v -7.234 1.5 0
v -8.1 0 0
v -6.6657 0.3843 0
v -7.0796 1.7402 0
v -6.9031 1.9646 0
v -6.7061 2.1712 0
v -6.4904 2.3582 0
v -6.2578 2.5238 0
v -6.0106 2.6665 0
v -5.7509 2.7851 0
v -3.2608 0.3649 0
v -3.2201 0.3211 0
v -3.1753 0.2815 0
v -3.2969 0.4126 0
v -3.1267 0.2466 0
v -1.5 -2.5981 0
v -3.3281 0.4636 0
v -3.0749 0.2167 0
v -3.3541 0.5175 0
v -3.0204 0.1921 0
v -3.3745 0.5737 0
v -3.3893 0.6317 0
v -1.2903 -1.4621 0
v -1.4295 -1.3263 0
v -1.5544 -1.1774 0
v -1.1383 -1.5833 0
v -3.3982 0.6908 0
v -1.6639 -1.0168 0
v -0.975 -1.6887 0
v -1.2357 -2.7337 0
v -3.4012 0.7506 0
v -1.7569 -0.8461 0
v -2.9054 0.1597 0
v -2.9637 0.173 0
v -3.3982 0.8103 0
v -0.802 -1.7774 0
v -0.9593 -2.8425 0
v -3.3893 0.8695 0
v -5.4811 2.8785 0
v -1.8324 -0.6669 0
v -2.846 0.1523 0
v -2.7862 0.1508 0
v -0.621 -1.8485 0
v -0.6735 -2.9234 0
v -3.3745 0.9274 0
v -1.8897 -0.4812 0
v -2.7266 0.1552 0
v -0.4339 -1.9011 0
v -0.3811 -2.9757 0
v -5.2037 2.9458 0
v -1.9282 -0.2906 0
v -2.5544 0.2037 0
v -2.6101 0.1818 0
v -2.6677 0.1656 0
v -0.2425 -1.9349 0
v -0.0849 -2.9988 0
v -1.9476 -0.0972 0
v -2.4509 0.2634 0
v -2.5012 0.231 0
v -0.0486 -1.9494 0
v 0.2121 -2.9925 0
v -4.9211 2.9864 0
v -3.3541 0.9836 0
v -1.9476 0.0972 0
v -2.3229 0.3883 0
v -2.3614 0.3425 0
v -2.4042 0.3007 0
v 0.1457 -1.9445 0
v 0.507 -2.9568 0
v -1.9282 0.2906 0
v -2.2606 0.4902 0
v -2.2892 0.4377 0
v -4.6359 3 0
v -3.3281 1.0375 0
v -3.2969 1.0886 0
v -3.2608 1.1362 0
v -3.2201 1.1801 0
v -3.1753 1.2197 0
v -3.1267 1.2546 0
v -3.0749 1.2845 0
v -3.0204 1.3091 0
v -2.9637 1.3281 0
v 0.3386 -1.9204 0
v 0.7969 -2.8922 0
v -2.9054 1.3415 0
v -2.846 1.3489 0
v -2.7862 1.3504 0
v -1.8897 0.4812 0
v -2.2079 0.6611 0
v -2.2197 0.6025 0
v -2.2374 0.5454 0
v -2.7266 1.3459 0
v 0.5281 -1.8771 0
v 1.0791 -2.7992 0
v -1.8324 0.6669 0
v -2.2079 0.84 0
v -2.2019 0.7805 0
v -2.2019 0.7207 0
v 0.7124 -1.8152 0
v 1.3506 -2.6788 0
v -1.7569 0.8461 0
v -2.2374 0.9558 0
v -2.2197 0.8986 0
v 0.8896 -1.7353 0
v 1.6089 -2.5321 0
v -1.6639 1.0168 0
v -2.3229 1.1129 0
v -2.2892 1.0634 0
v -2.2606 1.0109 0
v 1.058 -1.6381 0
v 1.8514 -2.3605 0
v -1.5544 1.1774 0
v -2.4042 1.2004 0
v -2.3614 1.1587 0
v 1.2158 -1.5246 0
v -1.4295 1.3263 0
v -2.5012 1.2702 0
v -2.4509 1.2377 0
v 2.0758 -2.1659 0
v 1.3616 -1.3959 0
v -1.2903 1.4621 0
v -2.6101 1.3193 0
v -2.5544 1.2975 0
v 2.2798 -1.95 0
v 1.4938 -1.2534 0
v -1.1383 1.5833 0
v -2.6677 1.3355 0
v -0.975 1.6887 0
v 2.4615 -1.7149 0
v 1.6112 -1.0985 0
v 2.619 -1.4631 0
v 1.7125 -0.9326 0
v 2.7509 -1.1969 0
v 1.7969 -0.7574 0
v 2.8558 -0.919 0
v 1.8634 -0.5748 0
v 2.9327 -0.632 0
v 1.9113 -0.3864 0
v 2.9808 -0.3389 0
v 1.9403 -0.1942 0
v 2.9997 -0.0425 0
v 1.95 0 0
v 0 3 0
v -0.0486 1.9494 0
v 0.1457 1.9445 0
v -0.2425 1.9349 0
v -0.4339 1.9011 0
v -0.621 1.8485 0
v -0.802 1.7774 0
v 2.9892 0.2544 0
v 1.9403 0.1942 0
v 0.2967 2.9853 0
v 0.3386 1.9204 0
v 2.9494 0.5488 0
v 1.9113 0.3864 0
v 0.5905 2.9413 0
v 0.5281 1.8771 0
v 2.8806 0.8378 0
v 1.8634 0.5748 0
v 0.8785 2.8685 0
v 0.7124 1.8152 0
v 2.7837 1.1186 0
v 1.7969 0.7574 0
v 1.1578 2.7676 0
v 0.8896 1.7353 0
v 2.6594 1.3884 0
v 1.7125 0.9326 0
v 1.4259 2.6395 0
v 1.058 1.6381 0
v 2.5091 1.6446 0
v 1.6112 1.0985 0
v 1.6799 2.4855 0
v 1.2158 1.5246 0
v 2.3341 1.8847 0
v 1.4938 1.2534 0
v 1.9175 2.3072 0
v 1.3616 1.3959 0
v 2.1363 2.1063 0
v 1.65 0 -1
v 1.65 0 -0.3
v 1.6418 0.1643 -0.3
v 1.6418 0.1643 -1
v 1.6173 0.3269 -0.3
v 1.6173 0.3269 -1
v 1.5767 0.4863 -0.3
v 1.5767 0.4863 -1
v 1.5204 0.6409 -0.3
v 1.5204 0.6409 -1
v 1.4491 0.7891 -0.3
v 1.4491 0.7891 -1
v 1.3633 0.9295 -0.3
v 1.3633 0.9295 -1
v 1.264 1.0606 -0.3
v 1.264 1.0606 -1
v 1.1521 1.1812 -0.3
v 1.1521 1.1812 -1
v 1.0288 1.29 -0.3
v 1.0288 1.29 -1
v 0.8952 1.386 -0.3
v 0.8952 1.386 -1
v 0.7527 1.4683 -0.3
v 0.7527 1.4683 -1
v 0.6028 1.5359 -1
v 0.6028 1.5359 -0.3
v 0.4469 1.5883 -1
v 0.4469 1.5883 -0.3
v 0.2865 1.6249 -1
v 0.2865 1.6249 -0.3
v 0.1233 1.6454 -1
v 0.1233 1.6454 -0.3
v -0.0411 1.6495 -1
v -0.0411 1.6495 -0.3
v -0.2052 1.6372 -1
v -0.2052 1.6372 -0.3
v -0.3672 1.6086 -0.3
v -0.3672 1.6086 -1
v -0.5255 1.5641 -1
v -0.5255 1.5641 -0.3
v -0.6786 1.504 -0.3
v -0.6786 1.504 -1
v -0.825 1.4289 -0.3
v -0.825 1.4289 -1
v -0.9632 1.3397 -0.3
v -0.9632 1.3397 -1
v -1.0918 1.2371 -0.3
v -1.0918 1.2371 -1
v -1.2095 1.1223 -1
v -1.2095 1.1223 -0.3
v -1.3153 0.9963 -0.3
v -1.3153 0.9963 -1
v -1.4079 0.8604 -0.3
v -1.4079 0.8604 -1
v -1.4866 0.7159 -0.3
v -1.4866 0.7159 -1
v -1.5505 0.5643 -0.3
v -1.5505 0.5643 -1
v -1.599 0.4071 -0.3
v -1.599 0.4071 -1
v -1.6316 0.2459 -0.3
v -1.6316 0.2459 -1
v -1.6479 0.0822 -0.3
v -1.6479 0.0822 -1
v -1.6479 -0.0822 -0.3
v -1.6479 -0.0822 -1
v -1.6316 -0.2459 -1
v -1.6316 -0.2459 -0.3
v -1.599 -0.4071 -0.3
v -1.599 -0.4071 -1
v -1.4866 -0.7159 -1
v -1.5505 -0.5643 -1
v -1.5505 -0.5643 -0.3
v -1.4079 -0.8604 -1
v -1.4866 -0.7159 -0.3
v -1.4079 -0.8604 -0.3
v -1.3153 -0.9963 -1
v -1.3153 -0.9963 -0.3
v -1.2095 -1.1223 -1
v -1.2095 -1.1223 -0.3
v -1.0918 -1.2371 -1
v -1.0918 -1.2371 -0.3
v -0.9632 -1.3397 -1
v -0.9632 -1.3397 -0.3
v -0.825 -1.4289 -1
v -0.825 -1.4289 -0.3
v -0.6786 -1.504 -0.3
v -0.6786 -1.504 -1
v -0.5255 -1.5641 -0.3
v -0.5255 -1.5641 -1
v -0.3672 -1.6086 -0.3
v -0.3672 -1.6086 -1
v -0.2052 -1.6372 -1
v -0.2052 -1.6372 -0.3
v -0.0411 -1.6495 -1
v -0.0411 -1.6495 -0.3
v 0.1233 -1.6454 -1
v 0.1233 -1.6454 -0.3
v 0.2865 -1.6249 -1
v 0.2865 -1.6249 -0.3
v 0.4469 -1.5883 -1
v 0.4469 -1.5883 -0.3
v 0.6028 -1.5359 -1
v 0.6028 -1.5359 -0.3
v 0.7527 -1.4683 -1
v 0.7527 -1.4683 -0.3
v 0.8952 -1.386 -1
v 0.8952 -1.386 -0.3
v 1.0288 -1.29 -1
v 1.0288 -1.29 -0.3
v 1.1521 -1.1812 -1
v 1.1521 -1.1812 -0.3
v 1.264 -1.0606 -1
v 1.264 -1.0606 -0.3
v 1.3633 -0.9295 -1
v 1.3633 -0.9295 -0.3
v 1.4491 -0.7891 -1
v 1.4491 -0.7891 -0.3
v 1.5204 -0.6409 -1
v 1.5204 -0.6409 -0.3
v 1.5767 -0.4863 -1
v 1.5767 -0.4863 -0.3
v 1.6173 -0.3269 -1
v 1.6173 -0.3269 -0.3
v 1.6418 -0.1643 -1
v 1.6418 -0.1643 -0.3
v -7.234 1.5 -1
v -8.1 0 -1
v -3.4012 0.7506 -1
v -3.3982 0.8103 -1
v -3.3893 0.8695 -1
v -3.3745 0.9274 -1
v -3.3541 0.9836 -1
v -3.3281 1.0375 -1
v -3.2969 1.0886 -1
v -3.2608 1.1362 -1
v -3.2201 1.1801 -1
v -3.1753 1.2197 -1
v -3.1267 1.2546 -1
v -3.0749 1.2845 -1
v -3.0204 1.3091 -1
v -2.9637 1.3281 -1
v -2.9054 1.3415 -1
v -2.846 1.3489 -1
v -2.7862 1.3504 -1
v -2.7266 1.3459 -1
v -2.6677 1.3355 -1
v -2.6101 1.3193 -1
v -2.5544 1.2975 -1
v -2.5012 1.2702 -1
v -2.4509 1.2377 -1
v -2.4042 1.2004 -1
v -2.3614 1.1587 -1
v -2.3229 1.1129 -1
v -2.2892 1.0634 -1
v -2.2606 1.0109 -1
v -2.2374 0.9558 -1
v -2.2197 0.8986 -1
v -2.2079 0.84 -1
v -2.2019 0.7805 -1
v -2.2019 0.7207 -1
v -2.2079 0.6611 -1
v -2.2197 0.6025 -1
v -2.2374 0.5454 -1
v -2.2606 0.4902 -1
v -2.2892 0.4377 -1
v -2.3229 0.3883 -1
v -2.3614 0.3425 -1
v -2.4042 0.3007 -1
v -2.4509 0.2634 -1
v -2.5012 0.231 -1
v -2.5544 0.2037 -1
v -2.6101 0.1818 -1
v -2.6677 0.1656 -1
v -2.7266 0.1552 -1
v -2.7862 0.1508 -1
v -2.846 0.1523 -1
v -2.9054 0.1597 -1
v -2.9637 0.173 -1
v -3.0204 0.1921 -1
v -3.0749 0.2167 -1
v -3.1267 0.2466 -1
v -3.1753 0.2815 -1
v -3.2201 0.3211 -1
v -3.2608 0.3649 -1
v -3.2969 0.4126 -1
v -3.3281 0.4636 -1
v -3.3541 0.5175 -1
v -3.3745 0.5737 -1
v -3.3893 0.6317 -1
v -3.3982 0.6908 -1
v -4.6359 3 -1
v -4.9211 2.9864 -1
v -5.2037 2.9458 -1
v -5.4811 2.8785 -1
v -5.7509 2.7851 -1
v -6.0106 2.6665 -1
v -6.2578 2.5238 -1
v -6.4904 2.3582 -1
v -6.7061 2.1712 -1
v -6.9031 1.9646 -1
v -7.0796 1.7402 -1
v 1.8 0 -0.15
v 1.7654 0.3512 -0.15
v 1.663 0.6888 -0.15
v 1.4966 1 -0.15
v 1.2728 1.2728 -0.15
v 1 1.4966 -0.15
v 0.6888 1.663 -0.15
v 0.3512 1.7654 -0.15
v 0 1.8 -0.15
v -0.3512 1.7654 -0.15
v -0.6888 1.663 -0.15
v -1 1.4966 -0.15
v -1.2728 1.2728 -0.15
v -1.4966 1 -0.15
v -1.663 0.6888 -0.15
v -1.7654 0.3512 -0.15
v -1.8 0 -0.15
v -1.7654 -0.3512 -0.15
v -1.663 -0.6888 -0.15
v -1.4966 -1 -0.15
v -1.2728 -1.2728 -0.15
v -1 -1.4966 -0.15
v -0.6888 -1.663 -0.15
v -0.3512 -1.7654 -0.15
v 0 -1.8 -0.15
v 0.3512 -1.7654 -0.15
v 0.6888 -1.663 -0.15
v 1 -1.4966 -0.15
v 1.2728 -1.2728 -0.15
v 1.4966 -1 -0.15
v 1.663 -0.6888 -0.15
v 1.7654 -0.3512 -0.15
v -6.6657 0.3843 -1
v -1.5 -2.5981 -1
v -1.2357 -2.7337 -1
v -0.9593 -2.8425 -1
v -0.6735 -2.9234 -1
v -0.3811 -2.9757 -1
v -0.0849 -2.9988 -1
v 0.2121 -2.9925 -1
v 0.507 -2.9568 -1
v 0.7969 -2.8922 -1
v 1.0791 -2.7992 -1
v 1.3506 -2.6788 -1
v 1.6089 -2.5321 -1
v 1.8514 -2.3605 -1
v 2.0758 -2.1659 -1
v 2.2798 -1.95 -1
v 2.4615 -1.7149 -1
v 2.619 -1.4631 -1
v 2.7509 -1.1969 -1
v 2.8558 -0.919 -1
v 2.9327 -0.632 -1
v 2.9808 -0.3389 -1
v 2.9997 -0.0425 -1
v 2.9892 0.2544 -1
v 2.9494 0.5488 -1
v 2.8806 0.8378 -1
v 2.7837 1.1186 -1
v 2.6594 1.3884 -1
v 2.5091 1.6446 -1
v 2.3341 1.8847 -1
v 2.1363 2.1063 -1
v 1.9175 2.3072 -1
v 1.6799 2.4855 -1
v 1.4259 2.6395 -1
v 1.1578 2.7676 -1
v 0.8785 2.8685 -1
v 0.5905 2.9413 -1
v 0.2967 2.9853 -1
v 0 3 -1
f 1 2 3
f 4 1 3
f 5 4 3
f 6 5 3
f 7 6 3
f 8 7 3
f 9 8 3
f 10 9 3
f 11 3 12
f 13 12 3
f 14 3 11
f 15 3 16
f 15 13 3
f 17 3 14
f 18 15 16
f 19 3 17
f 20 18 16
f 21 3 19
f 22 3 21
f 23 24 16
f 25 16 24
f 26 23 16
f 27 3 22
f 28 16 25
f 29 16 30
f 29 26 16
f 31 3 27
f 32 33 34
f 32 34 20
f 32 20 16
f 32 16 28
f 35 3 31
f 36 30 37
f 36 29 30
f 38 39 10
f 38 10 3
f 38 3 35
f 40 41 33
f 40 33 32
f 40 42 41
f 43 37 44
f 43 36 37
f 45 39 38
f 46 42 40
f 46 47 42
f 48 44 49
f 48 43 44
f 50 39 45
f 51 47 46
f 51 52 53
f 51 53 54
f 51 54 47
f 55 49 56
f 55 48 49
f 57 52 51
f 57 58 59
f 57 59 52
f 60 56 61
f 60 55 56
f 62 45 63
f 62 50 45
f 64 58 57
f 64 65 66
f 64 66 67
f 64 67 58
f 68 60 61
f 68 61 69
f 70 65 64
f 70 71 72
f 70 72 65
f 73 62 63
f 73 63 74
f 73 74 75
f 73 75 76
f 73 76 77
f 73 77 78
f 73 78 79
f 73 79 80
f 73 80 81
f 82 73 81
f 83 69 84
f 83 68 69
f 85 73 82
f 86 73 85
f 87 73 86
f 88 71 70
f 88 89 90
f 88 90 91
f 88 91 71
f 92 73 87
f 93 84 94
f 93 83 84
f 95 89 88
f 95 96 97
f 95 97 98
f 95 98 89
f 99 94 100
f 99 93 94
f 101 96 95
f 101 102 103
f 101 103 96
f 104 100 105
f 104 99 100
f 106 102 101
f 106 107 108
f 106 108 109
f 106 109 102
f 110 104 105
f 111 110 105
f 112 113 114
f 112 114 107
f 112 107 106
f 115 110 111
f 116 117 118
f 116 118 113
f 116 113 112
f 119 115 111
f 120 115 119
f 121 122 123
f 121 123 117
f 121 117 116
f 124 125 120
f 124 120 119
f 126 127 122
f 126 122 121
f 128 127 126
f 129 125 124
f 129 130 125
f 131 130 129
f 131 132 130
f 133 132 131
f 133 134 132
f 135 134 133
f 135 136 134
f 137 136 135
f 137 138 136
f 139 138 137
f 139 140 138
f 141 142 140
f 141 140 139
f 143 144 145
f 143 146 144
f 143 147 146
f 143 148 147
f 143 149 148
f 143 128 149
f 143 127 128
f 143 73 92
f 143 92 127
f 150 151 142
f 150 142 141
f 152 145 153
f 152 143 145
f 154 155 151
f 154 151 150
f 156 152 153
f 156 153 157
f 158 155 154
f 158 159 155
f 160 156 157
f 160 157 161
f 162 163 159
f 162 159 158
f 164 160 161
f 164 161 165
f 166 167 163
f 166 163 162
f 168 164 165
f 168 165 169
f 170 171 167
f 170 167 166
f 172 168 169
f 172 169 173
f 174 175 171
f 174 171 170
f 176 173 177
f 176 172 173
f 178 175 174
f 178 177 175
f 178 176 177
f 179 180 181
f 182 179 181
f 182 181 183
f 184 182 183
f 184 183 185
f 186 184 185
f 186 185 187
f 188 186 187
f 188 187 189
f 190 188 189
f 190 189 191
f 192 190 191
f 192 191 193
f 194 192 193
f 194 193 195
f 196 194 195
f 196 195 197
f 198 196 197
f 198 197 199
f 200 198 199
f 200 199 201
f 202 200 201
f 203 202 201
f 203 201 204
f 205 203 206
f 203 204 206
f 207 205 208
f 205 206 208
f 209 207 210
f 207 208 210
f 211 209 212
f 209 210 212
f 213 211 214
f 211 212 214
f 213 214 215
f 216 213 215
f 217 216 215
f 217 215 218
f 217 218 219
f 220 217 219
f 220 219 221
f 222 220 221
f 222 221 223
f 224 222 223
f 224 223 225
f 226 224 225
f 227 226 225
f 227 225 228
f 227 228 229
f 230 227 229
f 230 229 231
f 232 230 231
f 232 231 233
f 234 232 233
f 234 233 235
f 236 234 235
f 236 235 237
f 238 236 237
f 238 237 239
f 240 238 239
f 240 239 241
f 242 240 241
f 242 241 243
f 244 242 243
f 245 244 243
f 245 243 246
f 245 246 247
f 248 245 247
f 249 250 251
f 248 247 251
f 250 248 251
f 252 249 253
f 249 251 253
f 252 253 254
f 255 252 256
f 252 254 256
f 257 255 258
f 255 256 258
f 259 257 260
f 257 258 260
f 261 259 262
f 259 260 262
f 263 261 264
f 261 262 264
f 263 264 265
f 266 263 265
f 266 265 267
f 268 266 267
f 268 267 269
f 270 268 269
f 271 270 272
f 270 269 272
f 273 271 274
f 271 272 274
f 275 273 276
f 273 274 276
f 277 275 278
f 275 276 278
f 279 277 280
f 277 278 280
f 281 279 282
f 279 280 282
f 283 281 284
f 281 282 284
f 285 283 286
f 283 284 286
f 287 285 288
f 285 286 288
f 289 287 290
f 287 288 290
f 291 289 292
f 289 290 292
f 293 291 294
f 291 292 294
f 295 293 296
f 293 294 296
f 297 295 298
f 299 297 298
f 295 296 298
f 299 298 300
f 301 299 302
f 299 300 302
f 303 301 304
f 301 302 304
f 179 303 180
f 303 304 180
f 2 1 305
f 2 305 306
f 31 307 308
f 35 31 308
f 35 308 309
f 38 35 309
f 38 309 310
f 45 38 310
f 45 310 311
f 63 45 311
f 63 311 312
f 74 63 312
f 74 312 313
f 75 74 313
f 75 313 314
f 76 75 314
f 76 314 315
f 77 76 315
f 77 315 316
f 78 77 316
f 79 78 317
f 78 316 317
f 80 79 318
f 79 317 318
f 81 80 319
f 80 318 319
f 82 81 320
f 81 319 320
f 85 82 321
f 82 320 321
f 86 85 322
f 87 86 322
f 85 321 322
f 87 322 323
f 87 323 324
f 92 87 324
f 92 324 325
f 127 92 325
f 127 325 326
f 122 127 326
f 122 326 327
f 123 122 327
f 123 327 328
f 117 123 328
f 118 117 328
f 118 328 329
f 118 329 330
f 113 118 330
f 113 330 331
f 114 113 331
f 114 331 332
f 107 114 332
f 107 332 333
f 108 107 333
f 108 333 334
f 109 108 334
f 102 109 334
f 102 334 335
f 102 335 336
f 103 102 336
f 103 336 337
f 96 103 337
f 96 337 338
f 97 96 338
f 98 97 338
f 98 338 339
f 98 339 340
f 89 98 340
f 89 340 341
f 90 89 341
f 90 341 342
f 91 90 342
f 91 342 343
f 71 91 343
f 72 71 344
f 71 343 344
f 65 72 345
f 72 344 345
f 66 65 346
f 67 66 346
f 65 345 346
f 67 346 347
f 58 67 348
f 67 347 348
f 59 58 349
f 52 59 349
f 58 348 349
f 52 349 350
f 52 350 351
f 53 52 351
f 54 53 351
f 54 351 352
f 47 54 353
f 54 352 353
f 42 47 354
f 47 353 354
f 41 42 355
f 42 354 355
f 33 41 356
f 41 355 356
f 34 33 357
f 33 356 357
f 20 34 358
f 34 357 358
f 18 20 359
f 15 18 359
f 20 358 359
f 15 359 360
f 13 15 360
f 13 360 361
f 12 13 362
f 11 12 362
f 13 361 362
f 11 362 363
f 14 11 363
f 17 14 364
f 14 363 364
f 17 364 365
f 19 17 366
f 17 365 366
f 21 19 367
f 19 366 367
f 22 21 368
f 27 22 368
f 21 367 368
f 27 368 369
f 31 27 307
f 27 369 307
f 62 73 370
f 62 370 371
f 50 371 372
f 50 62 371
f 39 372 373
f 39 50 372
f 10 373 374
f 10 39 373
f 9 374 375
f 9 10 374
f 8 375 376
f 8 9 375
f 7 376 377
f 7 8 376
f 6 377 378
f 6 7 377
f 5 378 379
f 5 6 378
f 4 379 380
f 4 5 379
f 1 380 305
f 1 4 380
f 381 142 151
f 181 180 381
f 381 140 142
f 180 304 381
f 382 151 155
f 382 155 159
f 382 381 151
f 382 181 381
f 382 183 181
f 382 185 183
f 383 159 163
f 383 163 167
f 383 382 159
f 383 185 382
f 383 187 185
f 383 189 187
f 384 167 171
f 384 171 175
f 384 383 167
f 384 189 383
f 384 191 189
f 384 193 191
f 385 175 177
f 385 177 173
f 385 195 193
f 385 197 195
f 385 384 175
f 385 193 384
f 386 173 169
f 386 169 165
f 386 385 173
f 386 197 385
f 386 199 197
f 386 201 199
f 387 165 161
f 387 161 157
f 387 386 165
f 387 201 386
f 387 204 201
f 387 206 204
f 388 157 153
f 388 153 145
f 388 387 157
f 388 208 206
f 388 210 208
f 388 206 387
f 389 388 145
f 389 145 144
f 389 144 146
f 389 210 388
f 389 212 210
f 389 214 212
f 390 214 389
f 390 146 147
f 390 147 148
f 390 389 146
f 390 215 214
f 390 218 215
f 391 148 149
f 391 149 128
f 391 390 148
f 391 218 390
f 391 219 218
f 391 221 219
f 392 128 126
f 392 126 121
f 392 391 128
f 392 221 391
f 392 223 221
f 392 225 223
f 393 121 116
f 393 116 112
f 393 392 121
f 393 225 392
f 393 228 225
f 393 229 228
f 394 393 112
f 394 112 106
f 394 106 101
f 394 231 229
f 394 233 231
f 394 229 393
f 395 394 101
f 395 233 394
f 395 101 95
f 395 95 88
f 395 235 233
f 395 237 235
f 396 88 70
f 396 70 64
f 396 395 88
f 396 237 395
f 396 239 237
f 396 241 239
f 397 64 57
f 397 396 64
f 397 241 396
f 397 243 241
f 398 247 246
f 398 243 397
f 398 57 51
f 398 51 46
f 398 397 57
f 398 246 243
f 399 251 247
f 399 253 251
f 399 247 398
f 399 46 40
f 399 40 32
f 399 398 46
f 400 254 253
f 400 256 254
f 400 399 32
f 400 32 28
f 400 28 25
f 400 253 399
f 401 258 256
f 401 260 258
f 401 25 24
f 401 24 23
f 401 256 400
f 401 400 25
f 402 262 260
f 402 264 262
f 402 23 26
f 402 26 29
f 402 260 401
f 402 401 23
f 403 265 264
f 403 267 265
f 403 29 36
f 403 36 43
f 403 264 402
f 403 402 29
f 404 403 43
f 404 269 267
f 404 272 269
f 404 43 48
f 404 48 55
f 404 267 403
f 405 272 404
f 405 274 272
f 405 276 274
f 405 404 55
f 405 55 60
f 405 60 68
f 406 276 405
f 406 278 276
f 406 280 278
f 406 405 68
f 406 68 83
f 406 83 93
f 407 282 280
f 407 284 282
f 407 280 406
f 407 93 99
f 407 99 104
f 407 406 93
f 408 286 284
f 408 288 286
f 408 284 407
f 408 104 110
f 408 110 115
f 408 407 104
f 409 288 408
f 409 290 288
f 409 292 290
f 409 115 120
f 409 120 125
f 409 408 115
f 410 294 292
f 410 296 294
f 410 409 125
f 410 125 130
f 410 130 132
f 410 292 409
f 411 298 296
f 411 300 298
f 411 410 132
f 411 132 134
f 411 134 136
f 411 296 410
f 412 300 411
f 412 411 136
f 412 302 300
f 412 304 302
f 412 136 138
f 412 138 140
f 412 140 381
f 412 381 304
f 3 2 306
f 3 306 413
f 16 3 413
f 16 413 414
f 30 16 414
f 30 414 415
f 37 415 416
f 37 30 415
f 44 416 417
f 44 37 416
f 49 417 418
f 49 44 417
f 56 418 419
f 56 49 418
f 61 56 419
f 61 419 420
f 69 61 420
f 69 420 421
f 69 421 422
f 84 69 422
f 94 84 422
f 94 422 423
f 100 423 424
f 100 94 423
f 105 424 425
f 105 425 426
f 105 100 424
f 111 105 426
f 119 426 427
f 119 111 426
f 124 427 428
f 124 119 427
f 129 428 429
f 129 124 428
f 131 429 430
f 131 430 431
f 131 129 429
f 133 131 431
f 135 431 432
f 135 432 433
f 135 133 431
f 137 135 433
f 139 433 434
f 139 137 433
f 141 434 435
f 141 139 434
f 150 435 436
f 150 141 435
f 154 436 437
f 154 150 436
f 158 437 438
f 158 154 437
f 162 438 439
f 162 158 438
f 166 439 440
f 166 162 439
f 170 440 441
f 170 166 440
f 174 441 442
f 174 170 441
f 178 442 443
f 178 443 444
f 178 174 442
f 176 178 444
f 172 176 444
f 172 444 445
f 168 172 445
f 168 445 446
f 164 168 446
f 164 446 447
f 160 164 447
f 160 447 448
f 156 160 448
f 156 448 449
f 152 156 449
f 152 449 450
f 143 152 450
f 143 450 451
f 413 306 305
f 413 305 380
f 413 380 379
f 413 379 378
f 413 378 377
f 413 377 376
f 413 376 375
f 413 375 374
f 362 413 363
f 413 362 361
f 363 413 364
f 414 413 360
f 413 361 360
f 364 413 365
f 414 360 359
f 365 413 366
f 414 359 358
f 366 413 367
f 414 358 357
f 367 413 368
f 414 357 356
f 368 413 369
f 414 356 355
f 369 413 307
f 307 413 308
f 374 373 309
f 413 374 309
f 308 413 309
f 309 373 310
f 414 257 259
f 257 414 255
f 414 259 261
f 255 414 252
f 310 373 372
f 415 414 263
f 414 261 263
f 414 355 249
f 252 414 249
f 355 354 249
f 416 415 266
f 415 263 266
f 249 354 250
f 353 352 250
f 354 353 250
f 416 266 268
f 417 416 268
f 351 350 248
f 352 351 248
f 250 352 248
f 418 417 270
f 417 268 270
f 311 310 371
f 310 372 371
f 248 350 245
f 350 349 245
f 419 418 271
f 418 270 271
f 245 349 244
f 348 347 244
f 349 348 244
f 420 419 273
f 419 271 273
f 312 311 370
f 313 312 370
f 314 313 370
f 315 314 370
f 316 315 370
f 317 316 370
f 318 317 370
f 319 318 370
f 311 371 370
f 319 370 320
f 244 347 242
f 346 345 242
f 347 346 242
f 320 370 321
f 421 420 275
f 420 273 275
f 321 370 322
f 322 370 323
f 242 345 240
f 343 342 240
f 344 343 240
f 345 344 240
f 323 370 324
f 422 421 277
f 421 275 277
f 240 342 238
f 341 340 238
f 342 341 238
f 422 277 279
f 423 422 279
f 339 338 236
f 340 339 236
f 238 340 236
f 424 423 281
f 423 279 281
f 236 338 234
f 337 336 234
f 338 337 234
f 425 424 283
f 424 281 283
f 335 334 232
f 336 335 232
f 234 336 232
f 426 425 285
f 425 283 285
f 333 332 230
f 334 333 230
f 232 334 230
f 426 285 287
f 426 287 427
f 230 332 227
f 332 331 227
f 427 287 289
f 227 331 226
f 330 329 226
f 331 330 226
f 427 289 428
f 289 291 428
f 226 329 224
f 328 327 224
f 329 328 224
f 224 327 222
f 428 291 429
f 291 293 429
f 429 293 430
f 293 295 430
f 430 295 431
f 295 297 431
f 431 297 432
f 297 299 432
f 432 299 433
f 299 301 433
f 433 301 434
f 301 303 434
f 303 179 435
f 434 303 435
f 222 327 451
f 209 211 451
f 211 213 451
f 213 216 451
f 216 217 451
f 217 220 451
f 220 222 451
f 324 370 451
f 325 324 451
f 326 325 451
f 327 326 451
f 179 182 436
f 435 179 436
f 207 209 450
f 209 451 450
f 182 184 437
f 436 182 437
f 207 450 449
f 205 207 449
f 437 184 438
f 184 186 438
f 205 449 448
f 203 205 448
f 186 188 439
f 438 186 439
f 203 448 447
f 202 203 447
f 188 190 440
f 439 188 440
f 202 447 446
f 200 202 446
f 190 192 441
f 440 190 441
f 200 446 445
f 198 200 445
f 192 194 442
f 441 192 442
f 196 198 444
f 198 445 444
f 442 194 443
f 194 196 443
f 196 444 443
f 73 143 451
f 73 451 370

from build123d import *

# Parameters (mm, degrees)
BOSS_EXTRUDE1_DEPTH        = 1
CUT_EXTRUDE1_REACH         = 3
SKETCH2_R                  = 1.65
CHAMFER1_SIZE              = 0.3
F_1_2_1_2_DIAMETER_HOLE1_D = 1.2


with BuildPart() as part:
    # Sketch1 → Boss-Extrude1 (new body)
    with BuildSketch(Plane.XY):
        with BuildLine():
            Line((0, 3), (-4.635898385, 3))
            ThreePointArc((-4.635898385, 3), (-6.135898385, 2.598076211), (-7.233974596, 1.5))
            Line((-7.233974596, 1.5), (-8.1, 0))
            Line((-8.1, 0), (-6.665673326, 0.384326674))
            Line((-6.665673326, 0.384326674), (-1.5, -2.598076211))
            ThreePointArc((-1.5, -2.598076211), (2.897777479, -0.776457135), (0, 3))
        make_face()
    extrude(amount=-BOSS_EXTRUDE1_DEPTH)

    # Sketch2 → Cut-Extrude1 (cut, up to next)
    with BuildSketch(Plane.XY, mode=Mode.PRIVATE) as cut_extrude1_sk1:
        Circle(SKETCH2_R)
    cut_extrude1_tool1 = extrude(cut_extrude1_sk1.sketch, amount=-CUT_EXTRUDE1_REACH, mode=Mode.PRIVATE) & part.part
    add(cut_extrude1_tool1.solids().sort_by_distance((0, 0, 0))[0], mode=Mode.SUBTRACT)

    # Chamfer1
    chamfer1_edges = [part.edges().sort_by_distance(p)[0] for p in [
        (-1.65, 0, 0),
    ]]
    chamfer(chamfer1_edges, length=CHAMFER1_SIZE)

    # Ø1.2 (1.2) Diameter Hole1 (through all)
    with Locations(Plane.XY):
        with Locations((-2.801184896, 0.750575231)):
            Hole(F_1_2_1_2_DIAMETER_HOLE1_D / 2)


solid = part.part
